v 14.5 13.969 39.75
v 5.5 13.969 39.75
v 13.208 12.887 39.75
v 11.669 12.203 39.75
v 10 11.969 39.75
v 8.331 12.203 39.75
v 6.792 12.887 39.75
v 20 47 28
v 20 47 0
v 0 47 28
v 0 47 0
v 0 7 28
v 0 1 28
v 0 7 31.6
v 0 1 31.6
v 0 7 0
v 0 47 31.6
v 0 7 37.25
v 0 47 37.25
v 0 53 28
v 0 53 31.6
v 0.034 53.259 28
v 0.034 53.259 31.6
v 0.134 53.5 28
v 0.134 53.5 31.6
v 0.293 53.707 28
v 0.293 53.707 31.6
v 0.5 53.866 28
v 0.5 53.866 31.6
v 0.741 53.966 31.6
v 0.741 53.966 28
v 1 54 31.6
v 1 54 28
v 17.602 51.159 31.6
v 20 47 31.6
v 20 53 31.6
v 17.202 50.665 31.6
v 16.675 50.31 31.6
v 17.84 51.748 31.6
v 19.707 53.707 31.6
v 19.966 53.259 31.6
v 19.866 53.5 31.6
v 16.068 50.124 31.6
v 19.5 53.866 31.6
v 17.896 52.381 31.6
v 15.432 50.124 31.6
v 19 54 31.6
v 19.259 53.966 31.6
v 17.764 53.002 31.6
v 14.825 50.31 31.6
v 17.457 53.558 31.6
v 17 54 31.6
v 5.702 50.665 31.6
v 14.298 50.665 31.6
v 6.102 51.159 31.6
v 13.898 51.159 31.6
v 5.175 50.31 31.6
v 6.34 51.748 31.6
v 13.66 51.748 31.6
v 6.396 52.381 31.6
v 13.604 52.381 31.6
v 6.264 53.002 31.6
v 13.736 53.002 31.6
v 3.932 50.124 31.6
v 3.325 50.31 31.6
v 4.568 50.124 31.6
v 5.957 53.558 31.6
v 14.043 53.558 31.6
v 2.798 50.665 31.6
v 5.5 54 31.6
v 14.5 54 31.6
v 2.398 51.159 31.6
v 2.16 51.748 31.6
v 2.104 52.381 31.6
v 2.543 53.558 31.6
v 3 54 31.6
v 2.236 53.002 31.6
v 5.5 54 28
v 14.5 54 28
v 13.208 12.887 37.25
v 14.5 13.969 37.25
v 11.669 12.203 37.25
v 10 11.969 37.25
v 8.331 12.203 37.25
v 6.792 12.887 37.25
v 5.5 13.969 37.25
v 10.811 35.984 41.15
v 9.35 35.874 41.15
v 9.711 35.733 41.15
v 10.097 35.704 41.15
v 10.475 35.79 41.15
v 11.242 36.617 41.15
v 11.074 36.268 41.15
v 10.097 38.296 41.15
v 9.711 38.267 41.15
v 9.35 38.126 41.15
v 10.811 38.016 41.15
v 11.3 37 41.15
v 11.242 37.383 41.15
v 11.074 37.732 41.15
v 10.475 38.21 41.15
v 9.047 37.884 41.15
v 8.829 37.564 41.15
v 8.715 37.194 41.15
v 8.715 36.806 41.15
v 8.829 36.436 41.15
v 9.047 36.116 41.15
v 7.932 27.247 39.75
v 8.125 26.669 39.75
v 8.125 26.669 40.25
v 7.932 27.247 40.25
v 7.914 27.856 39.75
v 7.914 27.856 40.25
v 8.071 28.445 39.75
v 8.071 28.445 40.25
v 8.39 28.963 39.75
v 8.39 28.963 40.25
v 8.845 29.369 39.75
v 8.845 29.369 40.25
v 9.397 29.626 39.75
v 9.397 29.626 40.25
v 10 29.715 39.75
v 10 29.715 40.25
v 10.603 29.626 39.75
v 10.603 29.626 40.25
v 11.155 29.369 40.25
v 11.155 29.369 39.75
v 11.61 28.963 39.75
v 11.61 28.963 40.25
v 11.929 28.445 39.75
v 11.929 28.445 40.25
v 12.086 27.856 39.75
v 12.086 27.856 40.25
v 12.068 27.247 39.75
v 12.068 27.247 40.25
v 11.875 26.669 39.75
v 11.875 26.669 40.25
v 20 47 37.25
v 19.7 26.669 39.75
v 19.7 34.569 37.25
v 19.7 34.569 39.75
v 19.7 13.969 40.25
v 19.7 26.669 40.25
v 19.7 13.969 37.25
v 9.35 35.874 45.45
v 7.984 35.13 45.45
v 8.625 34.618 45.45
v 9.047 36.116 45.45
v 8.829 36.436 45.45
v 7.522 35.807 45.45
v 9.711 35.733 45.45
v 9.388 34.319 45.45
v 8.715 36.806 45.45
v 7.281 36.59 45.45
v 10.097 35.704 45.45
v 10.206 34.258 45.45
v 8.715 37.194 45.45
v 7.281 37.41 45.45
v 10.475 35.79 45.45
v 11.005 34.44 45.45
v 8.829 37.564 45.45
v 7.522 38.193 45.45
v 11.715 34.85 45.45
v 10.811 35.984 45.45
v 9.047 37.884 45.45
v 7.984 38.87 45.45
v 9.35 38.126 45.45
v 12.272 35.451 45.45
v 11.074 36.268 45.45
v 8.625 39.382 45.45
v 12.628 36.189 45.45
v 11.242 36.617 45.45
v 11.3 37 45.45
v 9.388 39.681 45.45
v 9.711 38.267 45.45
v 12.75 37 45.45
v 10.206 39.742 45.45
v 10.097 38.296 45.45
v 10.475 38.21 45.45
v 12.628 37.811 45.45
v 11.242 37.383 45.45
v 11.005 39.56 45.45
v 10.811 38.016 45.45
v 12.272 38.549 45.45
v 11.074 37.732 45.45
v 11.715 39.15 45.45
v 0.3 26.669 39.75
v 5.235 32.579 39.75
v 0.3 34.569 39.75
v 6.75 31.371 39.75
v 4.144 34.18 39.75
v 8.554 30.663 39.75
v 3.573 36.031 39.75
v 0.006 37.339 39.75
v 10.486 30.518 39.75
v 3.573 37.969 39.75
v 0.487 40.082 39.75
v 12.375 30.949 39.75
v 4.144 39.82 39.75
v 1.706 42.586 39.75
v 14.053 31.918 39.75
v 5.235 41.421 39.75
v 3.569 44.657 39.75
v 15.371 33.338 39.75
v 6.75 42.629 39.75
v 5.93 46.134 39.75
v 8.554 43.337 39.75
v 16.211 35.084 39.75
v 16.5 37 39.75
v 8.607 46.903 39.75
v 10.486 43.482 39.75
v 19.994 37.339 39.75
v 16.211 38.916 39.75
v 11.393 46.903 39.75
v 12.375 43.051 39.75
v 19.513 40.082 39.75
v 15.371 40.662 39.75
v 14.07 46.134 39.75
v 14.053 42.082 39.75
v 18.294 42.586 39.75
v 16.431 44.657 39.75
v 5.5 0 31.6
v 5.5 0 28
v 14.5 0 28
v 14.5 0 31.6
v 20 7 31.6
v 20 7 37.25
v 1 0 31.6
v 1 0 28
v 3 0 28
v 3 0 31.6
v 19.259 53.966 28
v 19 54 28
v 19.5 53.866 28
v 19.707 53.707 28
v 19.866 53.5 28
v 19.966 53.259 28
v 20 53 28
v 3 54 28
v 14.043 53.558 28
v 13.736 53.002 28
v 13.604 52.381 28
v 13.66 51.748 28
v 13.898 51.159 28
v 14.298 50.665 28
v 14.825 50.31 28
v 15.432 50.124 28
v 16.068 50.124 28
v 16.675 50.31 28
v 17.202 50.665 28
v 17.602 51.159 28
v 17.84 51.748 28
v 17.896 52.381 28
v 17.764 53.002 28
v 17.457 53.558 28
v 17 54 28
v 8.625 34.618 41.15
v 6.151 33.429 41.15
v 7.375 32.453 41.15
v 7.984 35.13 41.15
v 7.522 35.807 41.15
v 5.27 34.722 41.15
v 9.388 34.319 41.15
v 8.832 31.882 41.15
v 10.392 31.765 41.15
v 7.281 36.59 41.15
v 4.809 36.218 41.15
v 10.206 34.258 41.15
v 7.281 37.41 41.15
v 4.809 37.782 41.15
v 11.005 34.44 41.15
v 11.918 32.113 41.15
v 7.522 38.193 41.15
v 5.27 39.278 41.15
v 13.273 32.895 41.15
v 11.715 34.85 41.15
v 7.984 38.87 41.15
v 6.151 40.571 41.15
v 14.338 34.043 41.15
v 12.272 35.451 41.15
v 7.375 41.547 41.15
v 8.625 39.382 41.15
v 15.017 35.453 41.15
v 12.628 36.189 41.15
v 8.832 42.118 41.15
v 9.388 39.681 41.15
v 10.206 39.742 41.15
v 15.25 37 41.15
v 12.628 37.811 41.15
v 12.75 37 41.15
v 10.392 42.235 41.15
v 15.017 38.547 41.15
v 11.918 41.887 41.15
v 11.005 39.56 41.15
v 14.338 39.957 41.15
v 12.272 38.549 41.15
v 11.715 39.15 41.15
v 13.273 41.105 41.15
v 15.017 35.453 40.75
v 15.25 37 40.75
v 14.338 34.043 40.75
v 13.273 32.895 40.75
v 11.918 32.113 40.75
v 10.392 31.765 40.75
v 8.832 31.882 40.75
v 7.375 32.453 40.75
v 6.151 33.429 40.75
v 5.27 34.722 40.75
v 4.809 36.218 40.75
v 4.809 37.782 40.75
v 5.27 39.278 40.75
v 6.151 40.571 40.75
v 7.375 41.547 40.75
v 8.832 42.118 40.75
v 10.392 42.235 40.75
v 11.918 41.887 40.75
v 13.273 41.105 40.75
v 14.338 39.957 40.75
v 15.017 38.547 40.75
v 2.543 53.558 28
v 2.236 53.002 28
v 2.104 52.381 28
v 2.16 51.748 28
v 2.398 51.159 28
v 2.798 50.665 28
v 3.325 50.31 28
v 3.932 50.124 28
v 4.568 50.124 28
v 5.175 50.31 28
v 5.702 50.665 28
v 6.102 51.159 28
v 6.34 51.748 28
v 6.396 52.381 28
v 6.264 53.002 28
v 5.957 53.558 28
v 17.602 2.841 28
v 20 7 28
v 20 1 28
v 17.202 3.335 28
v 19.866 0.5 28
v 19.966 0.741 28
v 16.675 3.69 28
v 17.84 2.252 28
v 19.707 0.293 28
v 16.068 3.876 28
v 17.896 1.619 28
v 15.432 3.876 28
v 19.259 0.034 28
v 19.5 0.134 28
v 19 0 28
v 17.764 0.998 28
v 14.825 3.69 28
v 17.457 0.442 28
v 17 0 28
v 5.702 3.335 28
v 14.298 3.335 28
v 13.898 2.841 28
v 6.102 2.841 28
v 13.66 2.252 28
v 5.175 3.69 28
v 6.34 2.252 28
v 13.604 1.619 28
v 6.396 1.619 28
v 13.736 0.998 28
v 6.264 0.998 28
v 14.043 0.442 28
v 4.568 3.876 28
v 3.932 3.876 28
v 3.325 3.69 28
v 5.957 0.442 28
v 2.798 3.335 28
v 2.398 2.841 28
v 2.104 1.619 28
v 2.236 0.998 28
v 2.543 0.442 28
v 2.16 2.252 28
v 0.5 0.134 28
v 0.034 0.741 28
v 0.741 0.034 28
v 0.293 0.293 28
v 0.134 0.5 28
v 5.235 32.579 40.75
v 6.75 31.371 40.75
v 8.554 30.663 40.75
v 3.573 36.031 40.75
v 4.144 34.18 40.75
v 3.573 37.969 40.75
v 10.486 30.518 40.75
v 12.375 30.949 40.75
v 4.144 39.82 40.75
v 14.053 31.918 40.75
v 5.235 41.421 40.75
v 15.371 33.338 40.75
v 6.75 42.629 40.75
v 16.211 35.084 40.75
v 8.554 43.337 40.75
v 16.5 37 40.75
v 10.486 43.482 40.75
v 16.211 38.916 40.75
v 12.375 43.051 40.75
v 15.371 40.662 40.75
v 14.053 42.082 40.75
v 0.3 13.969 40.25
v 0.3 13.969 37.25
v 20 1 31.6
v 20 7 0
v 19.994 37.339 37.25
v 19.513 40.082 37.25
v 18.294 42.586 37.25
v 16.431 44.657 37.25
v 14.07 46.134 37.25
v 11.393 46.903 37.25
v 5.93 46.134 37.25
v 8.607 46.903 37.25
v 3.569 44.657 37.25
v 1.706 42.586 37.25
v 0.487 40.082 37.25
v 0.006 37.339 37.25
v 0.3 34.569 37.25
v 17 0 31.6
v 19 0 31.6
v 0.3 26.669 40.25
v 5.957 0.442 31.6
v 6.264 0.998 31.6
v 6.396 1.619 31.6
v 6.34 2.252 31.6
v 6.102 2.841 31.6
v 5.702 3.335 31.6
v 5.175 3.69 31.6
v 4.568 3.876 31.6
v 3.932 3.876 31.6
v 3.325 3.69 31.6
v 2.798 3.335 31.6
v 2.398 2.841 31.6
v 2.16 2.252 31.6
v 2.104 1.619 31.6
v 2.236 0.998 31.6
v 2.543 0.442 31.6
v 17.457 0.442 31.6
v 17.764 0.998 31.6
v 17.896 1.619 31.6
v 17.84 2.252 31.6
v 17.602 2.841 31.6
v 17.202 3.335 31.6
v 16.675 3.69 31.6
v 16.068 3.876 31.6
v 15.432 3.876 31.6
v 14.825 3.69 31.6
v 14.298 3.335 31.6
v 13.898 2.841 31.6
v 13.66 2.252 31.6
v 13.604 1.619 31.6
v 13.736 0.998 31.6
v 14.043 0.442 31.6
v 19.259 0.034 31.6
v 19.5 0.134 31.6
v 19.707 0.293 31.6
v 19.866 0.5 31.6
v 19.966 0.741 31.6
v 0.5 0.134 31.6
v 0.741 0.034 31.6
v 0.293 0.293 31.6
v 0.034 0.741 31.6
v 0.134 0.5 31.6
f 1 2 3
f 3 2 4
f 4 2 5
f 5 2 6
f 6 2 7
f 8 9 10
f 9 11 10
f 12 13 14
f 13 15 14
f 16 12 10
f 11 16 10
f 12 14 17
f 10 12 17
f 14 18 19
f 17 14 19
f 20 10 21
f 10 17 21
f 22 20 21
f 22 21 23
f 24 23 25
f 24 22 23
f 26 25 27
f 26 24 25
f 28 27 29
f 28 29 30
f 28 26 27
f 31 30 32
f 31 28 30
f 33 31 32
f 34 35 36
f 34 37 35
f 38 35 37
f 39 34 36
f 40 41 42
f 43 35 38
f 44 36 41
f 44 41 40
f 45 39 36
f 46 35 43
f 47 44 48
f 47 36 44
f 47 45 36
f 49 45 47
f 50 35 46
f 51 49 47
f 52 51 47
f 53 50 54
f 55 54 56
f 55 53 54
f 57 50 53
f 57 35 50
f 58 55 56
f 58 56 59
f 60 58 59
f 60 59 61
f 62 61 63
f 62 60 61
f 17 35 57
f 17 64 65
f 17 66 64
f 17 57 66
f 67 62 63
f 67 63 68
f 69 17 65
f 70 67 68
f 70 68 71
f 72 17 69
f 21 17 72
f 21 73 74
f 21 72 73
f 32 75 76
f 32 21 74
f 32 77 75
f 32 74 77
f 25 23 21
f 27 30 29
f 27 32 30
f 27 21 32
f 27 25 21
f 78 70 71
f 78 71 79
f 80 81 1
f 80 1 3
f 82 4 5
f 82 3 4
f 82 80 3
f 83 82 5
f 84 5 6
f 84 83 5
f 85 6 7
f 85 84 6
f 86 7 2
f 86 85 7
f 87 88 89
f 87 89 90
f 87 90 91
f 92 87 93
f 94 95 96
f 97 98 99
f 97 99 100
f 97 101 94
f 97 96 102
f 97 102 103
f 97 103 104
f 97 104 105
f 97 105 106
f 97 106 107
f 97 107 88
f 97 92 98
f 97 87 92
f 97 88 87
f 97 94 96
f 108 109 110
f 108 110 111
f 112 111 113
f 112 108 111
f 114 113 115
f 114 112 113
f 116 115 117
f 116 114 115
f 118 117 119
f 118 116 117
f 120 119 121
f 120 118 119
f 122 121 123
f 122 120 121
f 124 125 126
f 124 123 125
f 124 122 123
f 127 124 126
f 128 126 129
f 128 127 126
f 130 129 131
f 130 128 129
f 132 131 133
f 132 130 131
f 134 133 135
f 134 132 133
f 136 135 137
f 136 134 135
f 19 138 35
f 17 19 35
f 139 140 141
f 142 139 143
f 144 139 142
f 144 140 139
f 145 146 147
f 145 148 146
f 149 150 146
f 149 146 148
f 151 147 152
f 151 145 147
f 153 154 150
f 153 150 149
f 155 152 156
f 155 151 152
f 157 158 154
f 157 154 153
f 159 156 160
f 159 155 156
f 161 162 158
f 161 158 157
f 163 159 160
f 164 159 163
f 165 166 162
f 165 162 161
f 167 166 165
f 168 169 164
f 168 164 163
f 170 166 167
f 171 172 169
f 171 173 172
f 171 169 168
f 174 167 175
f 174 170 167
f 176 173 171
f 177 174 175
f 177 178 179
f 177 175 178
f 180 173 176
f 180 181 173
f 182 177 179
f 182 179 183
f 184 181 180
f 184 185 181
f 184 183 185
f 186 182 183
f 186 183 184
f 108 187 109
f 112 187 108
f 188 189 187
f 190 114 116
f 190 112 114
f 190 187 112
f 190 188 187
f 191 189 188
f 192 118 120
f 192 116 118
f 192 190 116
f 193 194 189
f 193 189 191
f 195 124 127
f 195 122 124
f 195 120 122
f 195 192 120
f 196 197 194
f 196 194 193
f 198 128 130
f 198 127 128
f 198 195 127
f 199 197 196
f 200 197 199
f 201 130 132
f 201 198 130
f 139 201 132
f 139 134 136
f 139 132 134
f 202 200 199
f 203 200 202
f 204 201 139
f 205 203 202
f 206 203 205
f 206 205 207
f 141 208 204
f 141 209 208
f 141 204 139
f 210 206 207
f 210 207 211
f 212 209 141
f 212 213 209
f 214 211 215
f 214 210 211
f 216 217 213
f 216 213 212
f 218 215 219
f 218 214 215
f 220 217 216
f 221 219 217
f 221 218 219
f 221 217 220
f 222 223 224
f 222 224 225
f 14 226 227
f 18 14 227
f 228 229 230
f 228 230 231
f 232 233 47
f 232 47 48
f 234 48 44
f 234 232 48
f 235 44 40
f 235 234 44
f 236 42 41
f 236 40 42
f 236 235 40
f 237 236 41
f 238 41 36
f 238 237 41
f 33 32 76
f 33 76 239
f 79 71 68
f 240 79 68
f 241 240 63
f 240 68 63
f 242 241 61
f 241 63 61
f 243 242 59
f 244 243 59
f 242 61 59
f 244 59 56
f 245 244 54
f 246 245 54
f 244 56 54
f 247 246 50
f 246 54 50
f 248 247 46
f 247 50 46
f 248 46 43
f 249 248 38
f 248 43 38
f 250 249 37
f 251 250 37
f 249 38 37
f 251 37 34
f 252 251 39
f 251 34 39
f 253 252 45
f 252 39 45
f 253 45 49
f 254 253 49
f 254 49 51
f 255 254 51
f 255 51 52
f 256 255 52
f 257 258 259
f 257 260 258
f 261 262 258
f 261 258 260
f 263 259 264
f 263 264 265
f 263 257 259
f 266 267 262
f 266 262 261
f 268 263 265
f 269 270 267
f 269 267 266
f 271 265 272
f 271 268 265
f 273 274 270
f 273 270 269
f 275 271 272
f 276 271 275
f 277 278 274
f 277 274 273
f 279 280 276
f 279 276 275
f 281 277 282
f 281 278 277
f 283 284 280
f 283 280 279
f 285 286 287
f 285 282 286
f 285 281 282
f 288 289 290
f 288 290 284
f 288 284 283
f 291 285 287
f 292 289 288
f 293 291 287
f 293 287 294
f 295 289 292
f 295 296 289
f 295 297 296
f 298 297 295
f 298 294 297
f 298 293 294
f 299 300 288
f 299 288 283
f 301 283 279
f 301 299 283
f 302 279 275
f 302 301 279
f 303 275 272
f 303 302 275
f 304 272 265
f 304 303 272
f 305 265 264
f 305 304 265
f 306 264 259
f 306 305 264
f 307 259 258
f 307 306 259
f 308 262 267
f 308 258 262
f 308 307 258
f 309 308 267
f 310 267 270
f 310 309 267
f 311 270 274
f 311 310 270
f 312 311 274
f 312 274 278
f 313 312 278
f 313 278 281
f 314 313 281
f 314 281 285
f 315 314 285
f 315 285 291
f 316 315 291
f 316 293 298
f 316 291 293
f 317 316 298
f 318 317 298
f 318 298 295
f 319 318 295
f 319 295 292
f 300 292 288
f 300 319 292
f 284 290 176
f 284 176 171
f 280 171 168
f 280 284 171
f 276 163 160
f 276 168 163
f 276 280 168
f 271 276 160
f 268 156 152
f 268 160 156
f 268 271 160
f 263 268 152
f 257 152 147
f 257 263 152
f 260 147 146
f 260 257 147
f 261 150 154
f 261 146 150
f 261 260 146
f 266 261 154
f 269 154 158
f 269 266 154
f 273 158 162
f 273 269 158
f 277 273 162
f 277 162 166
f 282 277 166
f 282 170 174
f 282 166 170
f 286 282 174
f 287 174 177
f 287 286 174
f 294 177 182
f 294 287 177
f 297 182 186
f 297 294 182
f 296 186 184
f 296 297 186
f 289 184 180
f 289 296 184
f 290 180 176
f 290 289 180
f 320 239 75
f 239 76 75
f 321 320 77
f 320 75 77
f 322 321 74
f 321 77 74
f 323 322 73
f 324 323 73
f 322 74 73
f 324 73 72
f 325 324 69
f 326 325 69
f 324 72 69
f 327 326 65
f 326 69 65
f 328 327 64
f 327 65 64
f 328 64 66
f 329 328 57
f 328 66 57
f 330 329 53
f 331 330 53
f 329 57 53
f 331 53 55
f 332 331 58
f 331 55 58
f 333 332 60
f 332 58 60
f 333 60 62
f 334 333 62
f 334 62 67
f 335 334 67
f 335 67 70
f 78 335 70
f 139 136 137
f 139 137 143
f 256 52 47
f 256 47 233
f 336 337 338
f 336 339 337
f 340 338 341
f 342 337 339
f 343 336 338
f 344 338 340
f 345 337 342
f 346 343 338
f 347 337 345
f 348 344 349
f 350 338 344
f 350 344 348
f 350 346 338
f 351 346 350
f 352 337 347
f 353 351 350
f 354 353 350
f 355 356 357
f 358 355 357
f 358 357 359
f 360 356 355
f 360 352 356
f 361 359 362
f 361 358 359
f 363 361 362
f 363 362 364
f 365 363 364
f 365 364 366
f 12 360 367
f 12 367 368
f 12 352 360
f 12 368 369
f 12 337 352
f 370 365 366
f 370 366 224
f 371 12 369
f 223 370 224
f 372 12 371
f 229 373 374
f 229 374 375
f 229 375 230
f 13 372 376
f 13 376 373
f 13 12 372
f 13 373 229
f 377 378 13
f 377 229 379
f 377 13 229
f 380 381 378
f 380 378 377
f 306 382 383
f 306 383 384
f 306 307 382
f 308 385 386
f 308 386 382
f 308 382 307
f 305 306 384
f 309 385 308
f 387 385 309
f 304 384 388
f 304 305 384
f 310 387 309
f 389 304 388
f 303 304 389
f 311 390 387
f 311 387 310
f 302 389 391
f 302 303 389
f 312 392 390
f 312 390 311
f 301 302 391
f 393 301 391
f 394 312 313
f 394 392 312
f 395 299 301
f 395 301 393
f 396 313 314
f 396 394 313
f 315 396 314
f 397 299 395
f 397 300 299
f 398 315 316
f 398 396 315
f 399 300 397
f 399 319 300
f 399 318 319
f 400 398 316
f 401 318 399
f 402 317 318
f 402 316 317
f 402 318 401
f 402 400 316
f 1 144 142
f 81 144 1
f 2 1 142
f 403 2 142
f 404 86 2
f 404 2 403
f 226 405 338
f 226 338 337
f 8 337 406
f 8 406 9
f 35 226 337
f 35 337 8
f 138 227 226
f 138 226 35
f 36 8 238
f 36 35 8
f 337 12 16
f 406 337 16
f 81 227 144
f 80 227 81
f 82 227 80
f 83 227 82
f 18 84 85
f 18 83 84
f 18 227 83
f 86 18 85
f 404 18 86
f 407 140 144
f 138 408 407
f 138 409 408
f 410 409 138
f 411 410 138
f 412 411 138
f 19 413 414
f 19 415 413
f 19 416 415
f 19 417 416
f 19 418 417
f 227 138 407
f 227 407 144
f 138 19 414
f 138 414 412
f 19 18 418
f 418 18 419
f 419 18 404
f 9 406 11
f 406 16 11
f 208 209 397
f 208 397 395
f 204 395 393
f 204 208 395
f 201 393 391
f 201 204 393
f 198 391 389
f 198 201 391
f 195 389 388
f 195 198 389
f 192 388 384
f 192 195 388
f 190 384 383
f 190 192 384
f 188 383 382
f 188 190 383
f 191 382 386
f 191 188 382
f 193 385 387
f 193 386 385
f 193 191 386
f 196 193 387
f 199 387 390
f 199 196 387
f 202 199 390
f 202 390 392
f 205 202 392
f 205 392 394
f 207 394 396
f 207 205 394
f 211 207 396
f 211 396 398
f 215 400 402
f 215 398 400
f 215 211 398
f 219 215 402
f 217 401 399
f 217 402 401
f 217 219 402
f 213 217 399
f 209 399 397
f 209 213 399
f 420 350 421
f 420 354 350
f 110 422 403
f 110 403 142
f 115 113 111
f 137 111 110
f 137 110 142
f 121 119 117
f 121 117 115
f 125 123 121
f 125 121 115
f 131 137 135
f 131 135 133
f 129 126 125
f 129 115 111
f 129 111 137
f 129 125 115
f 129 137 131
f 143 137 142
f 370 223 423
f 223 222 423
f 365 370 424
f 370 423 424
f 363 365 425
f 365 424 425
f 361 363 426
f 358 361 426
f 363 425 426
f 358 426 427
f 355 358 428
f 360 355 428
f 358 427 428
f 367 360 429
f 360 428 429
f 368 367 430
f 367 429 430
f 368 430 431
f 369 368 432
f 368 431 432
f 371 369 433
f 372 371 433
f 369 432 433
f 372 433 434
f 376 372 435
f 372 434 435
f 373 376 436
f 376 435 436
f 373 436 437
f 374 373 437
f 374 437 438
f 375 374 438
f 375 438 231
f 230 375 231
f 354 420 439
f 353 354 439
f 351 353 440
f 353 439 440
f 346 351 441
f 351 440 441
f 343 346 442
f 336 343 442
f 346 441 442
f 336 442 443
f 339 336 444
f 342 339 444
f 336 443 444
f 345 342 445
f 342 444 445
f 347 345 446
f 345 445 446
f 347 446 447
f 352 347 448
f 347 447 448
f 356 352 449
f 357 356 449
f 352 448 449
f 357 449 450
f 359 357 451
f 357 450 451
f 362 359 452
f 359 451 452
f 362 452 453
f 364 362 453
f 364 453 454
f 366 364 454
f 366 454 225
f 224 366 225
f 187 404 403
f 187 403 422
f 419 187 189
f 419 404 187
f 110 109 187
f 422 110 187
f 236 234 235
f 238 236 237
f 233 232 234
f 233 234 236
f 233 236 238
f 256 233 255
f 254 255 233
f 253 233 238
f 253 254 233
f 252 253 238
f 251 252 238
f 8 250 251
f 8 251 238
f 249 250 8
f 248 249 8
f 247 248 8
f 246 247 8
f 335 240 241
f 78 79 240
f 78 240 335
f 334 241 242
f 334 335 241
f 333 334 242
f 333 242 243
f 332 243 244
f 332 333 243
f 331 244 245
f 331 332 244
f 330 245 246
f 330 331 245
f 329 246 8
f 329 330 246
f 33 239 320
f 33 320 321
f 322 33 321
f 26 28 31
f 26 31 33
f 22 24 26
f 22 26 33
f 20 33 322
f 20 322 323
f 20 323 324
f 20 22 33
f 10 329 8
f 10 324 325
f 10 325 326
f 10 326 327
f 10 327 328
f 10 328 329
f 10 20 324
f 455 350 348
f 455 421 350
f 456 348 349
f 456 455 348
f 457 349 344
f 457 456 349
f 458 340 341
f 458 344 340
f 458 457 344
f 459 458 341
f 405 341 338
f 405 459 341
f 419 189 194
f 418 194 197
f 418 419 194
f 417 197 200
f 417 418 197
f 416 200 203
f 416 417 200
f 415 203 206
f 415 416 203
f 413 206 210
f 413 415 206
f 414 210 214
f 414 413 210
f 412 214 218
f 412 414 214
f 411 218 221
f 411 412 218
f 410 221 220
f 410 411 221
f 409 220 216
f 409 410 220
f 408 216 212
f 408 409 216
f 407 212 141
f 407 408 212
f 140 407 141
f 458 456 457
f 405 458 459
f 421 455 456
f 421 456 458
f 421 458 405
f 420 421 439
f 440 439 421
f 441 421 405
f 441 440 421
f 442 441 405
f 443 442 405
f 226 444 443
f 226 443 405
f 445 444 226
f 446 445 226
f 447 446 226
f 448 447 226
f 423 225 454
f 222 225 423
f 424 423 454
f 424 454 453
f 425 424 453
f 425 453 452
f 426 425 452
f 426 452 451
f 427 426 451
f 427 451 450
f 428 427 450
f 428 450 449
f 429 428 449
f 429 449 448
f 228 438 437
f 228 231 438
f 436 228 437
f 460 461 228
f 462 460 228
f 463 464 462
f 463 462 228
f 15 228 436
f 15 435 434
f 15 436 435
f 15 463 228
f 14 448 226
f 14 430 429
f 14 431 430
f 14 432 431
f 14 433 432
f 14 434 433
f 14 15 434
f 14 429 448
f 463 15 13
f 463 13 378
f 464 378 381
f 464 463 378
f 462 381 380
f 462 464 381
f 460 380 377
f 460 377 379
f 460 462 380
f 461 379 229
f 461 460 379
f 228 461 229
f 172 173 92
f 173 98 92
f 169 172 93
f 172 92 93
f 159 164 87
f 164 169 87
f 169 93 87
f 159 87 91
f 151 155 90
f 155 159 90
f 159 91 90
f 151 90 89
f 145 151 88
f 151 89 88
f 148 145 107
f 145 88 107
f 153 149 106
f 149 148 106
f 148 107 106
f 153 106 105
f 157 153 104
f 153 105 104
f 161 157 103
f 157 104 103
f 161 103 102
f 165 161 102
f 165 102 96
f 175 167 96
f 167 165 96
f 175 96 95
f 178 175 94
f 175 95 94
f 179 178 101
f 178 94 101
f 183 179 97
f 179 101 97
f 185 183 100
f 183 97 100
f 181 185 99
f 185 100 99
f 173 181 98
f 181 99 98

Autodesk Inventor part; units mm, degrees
ref_plane "YZ Plane" through (0, 0, 0) normal (1, 0, 0) x (0, 1, 0)
ref_plane "XZ Plane" through (0, 0, 0) normal (0, 1, 0) x (-1, 0, 0)
ref_plane "XY Plane" through (0, 0, 0) normal (0, 0, 1) x (1, 0, 0)
sketch "Sketch1" plane through (0, 0, 0) normal (1, 0, 0) x (0, 1, 0)
  line L0 (0, 0) -> (0, 38) construction
  line L1 (7, 0) -> (47, 0)
  line L2 (0, 0) -> (7, 0)
  line L3 (7, 0) -> (47, 0)
  line L4 (47, 0) -> (47, 28)
  line L5 (7, 28) -> (7, 0)
  line L6 (47, 28) -> (54, 28) construction
  line L7 (54, 0) -> (54, 47.2) construction
  line L8 (54, 47.2) -> (0, 47.2) construction
  line L9 (0, 28) -> (0, 31.6)
  line L10 (54, 31.6) -> (54, 28)
  line L11 (7, 31.6) -> (7, 37.25)
  line L12 (7, 37.25) -> (47, 37.25)
  line L13 (47, 37.25) -> (47, 31.6)
  line L14 (0, 31.6) -> (7, 31.6)
  line L15 (47, 31.6) -> (54, 31.6)
  line L16 (54, 28) -> (47, 28)
  line L17 (7, 28) -> (0, 28)
  dimension "d0" = 38
  dimension "d1" = 54
  dimension "d3" = 40
  dimension "d4" = 28
  dimension "d5" = 47.2
  dimension "d6" = 3.6
  dimension "d7" = 5.65
  dimension "d49" = 28
  dimension "d50" = 5.65
  dimension "d51" = 3.6
extrude "Extrusion1" add sketch "Sketch1" along normal blind 20
sketch "Sketch2" plane through (0, 7, 37.25) normal (0, 0, 1) x (1, 0, 0)
  line L0 (0, 40) -> (0, 0) projected
  line L1 (0, 0) -> (20, 0) projected
  line L2 (20, 40) -> (20, 0) projected
  line L3 (0, 40) -> (20, 40) projected
  line L4 (10, 39.7) -> (10, 30)
  line L5 (0, 0) -> (0, 40) projected
  circle A0 centre (10, 30) radius 1.3
  circle A1 centre (10, 30) radius 3
  arc A2 (19.7, 27.569) -> (0.3, 27.569) centre (10, 30) ccw
  line L6 (19.7, 27.569) -> (19.7, 6.969)
  line L7 (0.3, 6.969) -> (0.3, 27.569)
  arc A3 (5.5, 6.969) -> (14.5, 6.969) centre (10, 11.0315) ccw
  line L8 (19.7, 6.969) -> (14.5, 6.969)
  line L9 (5.5, 6.969) -> (0.3, 6.969)
  line L10 (10, 6.969) -> (10, 4.969) construction
  point P0 (0, -7)
  dimension "d11" = 9.7
  dimension "d12" = 2.6
  dimension "d13" = 6
  dimension "d14" = 20.6
  dimension "d19" = 9
  dimension "d20" = 2
extrude "Extrusion2" add sketch "Sketch2" along normal blind 2.5 contours A2 L6 L8 A3 L9 L7 | A0 | A1
sketch "Sketch3" plane through (0, 7, 39.75) normal (0, 0, 1) x (1, 0, 0)
  line L0 (14.5, 6.969) -> (19.7, 6.969) projected
  line L1 (0.3, 6.969) -> (0.3, 27.569) projected
  line L2 (19.7, 6.969) -> (0.3, 6.969)
  line L3 (0.3, 6.969) -> (0.3, 19.669)
  line L4 (19.7, 19.669) -> (19.7, 6.969)
  arc A0 (11.875, 19.669) -> (8.125, 19.669) centre (10, 20.6147) ccw
  line L5 (8.125, 19.669) -> (0.3, 19.669)
  line L6 (11.875, 19.669) -> (19.7, 19.669)
  point P0 (0, -7)
  dimension "d21" = 12.7
  dimension "d25" = 2.1
  dimension "d26" = 3.75
extrude "Extrusion3" add sketch "Sketch3" along normal blind 0.5
sketch "Sketch4" plane through (0, 7, 39.75) normal (0, 0, 1) x (1, 0, 0)
  line L0 (11.875, 19.669) -> (19.7, 19.669) projected
  line L1 (19.7, 19.669) -> (19.7, 27.569) projected
  arc A0 (19.7, 27.569) -> (0.3, 27.569) centre (10, 30) ccw projected
  line L2 (0.3, 27.569) -> (0.3, 19.669) projected
  line L3 (0.3, 19.669) -> (8.125, 19.669) projected
  arc A1 (11.875, 19.669) -> (8.125, 19.669) centre (10, 20.6147) ccw projected
  circle A2 centre (10, 30) radius 6.5
  point P0 (0, -7)
  dimension "d29" = 13
extrude "Extrusion4" add sketch "Sketch4" along normal blind 1 contours A2
sketch "Sketch5" plane through (10, 37, 40.75) normal (0, 0, 1) x (1, 0, 0)
  circle A0 centre (0, 0) radius 5.25
  point P0 (-10, -37)
  dimension "d32" = 10.5
extrude "Extrusion5" add sketch "Sketch5" along normal blind 0.4
sketch "Sketch6" plane through (10, 37, 41.15) normal (0, 0, 1) x (1, 0, 0)
  circle A0 centre (0, 0) radius 2.75
  circle A1 centre (0, 0) radius 1.3
  point P0 (-10, -37)
  dimension "d35" = 5.5
  dimension "d36" = 2.6
extrude "Extrusion6" add sketch "Sketch6" along normal blind 4.3
sketch "Sketch7" plane through (0, 0, 31.6) normal (0, 0, 1) x (1, 0, 0)
  line L0 (0, 7) -> (0, 0) projected
  line L1 (0, 0) -> (20, 0) projected
  line L2 (20, 7) -> (20, 0) projected
  line L3 (0, 7) -> (20, 7) projected
  line L4 (0, 54) -> (0, 47) projected
  line L5 (0, 47) -> (20, 47) projected
  line L6 (20, 54) -> (20, 47) projected
  line L7 (0, 54) -> (20, 54) projected
  line L8 (0, 0) -> (3, 0)
  arc A0 (5.5, 0) -> (3, 0) centre (4.25, 1.7493) ccw
  line L9 (10, 0) -> (10, 5.7084)
  arc A1 (17, 0) -> (14.5, 0) centre (15.75, 1.7493) ccw
  line L10 (17, 0) -> (14.5, 0)
  line L11 (0, 7) -> (0, 47) projected
  line L12 (0, 27) -> (24.9803, 27)
  line L13 (0, 54) -> (20, 54)
  line L14 (0, 54) -> (20, 54)
  line L15 (3, 54) -> (5.5, 54)
  arc A2 (3, 54) -> (5.5, 54) centre (4.25, 52.2507) ccw
  arc A3 (14.5, 54) -> (17, 54) centre (15.75, 52.2507) ccw
  line L16 (17, 54) -> (14.5, 54)
  line L17 (5.5, 54) -> (3, 54)
  line L18 (0, 54) -> (20, 54) projected
  line L19 (5.5, 0) -> (3, 0)
  point P0 (14.5, 54)
  point P1 (5.5, 54)
  point P2 (3, 54)
  point P3 (17, 0)
  point P4 (14.5, 0)
  point P5 (5.5, 0)
  point P6 (3, 0)
  dimension "d39" = 3
  dimension "d40" = 2.5
  dimension "d42" = 2.15
  dimension "d44" = 2.5
  dimension "d45" = 2.15
extrude "Extrusion7" cut sketch "Sketch7" against normal up to surface (3.6 mm away) contours A0 L1 | L1 A1 | L7 A2 | A3 L7
fillet "Fillet1" radius 1 4 edges at (0, 0, 29.8) (20, 0, 29.8) (0, 54, 29.8) (20, 54, 29.8)
properties part number "Motor Mg995"
